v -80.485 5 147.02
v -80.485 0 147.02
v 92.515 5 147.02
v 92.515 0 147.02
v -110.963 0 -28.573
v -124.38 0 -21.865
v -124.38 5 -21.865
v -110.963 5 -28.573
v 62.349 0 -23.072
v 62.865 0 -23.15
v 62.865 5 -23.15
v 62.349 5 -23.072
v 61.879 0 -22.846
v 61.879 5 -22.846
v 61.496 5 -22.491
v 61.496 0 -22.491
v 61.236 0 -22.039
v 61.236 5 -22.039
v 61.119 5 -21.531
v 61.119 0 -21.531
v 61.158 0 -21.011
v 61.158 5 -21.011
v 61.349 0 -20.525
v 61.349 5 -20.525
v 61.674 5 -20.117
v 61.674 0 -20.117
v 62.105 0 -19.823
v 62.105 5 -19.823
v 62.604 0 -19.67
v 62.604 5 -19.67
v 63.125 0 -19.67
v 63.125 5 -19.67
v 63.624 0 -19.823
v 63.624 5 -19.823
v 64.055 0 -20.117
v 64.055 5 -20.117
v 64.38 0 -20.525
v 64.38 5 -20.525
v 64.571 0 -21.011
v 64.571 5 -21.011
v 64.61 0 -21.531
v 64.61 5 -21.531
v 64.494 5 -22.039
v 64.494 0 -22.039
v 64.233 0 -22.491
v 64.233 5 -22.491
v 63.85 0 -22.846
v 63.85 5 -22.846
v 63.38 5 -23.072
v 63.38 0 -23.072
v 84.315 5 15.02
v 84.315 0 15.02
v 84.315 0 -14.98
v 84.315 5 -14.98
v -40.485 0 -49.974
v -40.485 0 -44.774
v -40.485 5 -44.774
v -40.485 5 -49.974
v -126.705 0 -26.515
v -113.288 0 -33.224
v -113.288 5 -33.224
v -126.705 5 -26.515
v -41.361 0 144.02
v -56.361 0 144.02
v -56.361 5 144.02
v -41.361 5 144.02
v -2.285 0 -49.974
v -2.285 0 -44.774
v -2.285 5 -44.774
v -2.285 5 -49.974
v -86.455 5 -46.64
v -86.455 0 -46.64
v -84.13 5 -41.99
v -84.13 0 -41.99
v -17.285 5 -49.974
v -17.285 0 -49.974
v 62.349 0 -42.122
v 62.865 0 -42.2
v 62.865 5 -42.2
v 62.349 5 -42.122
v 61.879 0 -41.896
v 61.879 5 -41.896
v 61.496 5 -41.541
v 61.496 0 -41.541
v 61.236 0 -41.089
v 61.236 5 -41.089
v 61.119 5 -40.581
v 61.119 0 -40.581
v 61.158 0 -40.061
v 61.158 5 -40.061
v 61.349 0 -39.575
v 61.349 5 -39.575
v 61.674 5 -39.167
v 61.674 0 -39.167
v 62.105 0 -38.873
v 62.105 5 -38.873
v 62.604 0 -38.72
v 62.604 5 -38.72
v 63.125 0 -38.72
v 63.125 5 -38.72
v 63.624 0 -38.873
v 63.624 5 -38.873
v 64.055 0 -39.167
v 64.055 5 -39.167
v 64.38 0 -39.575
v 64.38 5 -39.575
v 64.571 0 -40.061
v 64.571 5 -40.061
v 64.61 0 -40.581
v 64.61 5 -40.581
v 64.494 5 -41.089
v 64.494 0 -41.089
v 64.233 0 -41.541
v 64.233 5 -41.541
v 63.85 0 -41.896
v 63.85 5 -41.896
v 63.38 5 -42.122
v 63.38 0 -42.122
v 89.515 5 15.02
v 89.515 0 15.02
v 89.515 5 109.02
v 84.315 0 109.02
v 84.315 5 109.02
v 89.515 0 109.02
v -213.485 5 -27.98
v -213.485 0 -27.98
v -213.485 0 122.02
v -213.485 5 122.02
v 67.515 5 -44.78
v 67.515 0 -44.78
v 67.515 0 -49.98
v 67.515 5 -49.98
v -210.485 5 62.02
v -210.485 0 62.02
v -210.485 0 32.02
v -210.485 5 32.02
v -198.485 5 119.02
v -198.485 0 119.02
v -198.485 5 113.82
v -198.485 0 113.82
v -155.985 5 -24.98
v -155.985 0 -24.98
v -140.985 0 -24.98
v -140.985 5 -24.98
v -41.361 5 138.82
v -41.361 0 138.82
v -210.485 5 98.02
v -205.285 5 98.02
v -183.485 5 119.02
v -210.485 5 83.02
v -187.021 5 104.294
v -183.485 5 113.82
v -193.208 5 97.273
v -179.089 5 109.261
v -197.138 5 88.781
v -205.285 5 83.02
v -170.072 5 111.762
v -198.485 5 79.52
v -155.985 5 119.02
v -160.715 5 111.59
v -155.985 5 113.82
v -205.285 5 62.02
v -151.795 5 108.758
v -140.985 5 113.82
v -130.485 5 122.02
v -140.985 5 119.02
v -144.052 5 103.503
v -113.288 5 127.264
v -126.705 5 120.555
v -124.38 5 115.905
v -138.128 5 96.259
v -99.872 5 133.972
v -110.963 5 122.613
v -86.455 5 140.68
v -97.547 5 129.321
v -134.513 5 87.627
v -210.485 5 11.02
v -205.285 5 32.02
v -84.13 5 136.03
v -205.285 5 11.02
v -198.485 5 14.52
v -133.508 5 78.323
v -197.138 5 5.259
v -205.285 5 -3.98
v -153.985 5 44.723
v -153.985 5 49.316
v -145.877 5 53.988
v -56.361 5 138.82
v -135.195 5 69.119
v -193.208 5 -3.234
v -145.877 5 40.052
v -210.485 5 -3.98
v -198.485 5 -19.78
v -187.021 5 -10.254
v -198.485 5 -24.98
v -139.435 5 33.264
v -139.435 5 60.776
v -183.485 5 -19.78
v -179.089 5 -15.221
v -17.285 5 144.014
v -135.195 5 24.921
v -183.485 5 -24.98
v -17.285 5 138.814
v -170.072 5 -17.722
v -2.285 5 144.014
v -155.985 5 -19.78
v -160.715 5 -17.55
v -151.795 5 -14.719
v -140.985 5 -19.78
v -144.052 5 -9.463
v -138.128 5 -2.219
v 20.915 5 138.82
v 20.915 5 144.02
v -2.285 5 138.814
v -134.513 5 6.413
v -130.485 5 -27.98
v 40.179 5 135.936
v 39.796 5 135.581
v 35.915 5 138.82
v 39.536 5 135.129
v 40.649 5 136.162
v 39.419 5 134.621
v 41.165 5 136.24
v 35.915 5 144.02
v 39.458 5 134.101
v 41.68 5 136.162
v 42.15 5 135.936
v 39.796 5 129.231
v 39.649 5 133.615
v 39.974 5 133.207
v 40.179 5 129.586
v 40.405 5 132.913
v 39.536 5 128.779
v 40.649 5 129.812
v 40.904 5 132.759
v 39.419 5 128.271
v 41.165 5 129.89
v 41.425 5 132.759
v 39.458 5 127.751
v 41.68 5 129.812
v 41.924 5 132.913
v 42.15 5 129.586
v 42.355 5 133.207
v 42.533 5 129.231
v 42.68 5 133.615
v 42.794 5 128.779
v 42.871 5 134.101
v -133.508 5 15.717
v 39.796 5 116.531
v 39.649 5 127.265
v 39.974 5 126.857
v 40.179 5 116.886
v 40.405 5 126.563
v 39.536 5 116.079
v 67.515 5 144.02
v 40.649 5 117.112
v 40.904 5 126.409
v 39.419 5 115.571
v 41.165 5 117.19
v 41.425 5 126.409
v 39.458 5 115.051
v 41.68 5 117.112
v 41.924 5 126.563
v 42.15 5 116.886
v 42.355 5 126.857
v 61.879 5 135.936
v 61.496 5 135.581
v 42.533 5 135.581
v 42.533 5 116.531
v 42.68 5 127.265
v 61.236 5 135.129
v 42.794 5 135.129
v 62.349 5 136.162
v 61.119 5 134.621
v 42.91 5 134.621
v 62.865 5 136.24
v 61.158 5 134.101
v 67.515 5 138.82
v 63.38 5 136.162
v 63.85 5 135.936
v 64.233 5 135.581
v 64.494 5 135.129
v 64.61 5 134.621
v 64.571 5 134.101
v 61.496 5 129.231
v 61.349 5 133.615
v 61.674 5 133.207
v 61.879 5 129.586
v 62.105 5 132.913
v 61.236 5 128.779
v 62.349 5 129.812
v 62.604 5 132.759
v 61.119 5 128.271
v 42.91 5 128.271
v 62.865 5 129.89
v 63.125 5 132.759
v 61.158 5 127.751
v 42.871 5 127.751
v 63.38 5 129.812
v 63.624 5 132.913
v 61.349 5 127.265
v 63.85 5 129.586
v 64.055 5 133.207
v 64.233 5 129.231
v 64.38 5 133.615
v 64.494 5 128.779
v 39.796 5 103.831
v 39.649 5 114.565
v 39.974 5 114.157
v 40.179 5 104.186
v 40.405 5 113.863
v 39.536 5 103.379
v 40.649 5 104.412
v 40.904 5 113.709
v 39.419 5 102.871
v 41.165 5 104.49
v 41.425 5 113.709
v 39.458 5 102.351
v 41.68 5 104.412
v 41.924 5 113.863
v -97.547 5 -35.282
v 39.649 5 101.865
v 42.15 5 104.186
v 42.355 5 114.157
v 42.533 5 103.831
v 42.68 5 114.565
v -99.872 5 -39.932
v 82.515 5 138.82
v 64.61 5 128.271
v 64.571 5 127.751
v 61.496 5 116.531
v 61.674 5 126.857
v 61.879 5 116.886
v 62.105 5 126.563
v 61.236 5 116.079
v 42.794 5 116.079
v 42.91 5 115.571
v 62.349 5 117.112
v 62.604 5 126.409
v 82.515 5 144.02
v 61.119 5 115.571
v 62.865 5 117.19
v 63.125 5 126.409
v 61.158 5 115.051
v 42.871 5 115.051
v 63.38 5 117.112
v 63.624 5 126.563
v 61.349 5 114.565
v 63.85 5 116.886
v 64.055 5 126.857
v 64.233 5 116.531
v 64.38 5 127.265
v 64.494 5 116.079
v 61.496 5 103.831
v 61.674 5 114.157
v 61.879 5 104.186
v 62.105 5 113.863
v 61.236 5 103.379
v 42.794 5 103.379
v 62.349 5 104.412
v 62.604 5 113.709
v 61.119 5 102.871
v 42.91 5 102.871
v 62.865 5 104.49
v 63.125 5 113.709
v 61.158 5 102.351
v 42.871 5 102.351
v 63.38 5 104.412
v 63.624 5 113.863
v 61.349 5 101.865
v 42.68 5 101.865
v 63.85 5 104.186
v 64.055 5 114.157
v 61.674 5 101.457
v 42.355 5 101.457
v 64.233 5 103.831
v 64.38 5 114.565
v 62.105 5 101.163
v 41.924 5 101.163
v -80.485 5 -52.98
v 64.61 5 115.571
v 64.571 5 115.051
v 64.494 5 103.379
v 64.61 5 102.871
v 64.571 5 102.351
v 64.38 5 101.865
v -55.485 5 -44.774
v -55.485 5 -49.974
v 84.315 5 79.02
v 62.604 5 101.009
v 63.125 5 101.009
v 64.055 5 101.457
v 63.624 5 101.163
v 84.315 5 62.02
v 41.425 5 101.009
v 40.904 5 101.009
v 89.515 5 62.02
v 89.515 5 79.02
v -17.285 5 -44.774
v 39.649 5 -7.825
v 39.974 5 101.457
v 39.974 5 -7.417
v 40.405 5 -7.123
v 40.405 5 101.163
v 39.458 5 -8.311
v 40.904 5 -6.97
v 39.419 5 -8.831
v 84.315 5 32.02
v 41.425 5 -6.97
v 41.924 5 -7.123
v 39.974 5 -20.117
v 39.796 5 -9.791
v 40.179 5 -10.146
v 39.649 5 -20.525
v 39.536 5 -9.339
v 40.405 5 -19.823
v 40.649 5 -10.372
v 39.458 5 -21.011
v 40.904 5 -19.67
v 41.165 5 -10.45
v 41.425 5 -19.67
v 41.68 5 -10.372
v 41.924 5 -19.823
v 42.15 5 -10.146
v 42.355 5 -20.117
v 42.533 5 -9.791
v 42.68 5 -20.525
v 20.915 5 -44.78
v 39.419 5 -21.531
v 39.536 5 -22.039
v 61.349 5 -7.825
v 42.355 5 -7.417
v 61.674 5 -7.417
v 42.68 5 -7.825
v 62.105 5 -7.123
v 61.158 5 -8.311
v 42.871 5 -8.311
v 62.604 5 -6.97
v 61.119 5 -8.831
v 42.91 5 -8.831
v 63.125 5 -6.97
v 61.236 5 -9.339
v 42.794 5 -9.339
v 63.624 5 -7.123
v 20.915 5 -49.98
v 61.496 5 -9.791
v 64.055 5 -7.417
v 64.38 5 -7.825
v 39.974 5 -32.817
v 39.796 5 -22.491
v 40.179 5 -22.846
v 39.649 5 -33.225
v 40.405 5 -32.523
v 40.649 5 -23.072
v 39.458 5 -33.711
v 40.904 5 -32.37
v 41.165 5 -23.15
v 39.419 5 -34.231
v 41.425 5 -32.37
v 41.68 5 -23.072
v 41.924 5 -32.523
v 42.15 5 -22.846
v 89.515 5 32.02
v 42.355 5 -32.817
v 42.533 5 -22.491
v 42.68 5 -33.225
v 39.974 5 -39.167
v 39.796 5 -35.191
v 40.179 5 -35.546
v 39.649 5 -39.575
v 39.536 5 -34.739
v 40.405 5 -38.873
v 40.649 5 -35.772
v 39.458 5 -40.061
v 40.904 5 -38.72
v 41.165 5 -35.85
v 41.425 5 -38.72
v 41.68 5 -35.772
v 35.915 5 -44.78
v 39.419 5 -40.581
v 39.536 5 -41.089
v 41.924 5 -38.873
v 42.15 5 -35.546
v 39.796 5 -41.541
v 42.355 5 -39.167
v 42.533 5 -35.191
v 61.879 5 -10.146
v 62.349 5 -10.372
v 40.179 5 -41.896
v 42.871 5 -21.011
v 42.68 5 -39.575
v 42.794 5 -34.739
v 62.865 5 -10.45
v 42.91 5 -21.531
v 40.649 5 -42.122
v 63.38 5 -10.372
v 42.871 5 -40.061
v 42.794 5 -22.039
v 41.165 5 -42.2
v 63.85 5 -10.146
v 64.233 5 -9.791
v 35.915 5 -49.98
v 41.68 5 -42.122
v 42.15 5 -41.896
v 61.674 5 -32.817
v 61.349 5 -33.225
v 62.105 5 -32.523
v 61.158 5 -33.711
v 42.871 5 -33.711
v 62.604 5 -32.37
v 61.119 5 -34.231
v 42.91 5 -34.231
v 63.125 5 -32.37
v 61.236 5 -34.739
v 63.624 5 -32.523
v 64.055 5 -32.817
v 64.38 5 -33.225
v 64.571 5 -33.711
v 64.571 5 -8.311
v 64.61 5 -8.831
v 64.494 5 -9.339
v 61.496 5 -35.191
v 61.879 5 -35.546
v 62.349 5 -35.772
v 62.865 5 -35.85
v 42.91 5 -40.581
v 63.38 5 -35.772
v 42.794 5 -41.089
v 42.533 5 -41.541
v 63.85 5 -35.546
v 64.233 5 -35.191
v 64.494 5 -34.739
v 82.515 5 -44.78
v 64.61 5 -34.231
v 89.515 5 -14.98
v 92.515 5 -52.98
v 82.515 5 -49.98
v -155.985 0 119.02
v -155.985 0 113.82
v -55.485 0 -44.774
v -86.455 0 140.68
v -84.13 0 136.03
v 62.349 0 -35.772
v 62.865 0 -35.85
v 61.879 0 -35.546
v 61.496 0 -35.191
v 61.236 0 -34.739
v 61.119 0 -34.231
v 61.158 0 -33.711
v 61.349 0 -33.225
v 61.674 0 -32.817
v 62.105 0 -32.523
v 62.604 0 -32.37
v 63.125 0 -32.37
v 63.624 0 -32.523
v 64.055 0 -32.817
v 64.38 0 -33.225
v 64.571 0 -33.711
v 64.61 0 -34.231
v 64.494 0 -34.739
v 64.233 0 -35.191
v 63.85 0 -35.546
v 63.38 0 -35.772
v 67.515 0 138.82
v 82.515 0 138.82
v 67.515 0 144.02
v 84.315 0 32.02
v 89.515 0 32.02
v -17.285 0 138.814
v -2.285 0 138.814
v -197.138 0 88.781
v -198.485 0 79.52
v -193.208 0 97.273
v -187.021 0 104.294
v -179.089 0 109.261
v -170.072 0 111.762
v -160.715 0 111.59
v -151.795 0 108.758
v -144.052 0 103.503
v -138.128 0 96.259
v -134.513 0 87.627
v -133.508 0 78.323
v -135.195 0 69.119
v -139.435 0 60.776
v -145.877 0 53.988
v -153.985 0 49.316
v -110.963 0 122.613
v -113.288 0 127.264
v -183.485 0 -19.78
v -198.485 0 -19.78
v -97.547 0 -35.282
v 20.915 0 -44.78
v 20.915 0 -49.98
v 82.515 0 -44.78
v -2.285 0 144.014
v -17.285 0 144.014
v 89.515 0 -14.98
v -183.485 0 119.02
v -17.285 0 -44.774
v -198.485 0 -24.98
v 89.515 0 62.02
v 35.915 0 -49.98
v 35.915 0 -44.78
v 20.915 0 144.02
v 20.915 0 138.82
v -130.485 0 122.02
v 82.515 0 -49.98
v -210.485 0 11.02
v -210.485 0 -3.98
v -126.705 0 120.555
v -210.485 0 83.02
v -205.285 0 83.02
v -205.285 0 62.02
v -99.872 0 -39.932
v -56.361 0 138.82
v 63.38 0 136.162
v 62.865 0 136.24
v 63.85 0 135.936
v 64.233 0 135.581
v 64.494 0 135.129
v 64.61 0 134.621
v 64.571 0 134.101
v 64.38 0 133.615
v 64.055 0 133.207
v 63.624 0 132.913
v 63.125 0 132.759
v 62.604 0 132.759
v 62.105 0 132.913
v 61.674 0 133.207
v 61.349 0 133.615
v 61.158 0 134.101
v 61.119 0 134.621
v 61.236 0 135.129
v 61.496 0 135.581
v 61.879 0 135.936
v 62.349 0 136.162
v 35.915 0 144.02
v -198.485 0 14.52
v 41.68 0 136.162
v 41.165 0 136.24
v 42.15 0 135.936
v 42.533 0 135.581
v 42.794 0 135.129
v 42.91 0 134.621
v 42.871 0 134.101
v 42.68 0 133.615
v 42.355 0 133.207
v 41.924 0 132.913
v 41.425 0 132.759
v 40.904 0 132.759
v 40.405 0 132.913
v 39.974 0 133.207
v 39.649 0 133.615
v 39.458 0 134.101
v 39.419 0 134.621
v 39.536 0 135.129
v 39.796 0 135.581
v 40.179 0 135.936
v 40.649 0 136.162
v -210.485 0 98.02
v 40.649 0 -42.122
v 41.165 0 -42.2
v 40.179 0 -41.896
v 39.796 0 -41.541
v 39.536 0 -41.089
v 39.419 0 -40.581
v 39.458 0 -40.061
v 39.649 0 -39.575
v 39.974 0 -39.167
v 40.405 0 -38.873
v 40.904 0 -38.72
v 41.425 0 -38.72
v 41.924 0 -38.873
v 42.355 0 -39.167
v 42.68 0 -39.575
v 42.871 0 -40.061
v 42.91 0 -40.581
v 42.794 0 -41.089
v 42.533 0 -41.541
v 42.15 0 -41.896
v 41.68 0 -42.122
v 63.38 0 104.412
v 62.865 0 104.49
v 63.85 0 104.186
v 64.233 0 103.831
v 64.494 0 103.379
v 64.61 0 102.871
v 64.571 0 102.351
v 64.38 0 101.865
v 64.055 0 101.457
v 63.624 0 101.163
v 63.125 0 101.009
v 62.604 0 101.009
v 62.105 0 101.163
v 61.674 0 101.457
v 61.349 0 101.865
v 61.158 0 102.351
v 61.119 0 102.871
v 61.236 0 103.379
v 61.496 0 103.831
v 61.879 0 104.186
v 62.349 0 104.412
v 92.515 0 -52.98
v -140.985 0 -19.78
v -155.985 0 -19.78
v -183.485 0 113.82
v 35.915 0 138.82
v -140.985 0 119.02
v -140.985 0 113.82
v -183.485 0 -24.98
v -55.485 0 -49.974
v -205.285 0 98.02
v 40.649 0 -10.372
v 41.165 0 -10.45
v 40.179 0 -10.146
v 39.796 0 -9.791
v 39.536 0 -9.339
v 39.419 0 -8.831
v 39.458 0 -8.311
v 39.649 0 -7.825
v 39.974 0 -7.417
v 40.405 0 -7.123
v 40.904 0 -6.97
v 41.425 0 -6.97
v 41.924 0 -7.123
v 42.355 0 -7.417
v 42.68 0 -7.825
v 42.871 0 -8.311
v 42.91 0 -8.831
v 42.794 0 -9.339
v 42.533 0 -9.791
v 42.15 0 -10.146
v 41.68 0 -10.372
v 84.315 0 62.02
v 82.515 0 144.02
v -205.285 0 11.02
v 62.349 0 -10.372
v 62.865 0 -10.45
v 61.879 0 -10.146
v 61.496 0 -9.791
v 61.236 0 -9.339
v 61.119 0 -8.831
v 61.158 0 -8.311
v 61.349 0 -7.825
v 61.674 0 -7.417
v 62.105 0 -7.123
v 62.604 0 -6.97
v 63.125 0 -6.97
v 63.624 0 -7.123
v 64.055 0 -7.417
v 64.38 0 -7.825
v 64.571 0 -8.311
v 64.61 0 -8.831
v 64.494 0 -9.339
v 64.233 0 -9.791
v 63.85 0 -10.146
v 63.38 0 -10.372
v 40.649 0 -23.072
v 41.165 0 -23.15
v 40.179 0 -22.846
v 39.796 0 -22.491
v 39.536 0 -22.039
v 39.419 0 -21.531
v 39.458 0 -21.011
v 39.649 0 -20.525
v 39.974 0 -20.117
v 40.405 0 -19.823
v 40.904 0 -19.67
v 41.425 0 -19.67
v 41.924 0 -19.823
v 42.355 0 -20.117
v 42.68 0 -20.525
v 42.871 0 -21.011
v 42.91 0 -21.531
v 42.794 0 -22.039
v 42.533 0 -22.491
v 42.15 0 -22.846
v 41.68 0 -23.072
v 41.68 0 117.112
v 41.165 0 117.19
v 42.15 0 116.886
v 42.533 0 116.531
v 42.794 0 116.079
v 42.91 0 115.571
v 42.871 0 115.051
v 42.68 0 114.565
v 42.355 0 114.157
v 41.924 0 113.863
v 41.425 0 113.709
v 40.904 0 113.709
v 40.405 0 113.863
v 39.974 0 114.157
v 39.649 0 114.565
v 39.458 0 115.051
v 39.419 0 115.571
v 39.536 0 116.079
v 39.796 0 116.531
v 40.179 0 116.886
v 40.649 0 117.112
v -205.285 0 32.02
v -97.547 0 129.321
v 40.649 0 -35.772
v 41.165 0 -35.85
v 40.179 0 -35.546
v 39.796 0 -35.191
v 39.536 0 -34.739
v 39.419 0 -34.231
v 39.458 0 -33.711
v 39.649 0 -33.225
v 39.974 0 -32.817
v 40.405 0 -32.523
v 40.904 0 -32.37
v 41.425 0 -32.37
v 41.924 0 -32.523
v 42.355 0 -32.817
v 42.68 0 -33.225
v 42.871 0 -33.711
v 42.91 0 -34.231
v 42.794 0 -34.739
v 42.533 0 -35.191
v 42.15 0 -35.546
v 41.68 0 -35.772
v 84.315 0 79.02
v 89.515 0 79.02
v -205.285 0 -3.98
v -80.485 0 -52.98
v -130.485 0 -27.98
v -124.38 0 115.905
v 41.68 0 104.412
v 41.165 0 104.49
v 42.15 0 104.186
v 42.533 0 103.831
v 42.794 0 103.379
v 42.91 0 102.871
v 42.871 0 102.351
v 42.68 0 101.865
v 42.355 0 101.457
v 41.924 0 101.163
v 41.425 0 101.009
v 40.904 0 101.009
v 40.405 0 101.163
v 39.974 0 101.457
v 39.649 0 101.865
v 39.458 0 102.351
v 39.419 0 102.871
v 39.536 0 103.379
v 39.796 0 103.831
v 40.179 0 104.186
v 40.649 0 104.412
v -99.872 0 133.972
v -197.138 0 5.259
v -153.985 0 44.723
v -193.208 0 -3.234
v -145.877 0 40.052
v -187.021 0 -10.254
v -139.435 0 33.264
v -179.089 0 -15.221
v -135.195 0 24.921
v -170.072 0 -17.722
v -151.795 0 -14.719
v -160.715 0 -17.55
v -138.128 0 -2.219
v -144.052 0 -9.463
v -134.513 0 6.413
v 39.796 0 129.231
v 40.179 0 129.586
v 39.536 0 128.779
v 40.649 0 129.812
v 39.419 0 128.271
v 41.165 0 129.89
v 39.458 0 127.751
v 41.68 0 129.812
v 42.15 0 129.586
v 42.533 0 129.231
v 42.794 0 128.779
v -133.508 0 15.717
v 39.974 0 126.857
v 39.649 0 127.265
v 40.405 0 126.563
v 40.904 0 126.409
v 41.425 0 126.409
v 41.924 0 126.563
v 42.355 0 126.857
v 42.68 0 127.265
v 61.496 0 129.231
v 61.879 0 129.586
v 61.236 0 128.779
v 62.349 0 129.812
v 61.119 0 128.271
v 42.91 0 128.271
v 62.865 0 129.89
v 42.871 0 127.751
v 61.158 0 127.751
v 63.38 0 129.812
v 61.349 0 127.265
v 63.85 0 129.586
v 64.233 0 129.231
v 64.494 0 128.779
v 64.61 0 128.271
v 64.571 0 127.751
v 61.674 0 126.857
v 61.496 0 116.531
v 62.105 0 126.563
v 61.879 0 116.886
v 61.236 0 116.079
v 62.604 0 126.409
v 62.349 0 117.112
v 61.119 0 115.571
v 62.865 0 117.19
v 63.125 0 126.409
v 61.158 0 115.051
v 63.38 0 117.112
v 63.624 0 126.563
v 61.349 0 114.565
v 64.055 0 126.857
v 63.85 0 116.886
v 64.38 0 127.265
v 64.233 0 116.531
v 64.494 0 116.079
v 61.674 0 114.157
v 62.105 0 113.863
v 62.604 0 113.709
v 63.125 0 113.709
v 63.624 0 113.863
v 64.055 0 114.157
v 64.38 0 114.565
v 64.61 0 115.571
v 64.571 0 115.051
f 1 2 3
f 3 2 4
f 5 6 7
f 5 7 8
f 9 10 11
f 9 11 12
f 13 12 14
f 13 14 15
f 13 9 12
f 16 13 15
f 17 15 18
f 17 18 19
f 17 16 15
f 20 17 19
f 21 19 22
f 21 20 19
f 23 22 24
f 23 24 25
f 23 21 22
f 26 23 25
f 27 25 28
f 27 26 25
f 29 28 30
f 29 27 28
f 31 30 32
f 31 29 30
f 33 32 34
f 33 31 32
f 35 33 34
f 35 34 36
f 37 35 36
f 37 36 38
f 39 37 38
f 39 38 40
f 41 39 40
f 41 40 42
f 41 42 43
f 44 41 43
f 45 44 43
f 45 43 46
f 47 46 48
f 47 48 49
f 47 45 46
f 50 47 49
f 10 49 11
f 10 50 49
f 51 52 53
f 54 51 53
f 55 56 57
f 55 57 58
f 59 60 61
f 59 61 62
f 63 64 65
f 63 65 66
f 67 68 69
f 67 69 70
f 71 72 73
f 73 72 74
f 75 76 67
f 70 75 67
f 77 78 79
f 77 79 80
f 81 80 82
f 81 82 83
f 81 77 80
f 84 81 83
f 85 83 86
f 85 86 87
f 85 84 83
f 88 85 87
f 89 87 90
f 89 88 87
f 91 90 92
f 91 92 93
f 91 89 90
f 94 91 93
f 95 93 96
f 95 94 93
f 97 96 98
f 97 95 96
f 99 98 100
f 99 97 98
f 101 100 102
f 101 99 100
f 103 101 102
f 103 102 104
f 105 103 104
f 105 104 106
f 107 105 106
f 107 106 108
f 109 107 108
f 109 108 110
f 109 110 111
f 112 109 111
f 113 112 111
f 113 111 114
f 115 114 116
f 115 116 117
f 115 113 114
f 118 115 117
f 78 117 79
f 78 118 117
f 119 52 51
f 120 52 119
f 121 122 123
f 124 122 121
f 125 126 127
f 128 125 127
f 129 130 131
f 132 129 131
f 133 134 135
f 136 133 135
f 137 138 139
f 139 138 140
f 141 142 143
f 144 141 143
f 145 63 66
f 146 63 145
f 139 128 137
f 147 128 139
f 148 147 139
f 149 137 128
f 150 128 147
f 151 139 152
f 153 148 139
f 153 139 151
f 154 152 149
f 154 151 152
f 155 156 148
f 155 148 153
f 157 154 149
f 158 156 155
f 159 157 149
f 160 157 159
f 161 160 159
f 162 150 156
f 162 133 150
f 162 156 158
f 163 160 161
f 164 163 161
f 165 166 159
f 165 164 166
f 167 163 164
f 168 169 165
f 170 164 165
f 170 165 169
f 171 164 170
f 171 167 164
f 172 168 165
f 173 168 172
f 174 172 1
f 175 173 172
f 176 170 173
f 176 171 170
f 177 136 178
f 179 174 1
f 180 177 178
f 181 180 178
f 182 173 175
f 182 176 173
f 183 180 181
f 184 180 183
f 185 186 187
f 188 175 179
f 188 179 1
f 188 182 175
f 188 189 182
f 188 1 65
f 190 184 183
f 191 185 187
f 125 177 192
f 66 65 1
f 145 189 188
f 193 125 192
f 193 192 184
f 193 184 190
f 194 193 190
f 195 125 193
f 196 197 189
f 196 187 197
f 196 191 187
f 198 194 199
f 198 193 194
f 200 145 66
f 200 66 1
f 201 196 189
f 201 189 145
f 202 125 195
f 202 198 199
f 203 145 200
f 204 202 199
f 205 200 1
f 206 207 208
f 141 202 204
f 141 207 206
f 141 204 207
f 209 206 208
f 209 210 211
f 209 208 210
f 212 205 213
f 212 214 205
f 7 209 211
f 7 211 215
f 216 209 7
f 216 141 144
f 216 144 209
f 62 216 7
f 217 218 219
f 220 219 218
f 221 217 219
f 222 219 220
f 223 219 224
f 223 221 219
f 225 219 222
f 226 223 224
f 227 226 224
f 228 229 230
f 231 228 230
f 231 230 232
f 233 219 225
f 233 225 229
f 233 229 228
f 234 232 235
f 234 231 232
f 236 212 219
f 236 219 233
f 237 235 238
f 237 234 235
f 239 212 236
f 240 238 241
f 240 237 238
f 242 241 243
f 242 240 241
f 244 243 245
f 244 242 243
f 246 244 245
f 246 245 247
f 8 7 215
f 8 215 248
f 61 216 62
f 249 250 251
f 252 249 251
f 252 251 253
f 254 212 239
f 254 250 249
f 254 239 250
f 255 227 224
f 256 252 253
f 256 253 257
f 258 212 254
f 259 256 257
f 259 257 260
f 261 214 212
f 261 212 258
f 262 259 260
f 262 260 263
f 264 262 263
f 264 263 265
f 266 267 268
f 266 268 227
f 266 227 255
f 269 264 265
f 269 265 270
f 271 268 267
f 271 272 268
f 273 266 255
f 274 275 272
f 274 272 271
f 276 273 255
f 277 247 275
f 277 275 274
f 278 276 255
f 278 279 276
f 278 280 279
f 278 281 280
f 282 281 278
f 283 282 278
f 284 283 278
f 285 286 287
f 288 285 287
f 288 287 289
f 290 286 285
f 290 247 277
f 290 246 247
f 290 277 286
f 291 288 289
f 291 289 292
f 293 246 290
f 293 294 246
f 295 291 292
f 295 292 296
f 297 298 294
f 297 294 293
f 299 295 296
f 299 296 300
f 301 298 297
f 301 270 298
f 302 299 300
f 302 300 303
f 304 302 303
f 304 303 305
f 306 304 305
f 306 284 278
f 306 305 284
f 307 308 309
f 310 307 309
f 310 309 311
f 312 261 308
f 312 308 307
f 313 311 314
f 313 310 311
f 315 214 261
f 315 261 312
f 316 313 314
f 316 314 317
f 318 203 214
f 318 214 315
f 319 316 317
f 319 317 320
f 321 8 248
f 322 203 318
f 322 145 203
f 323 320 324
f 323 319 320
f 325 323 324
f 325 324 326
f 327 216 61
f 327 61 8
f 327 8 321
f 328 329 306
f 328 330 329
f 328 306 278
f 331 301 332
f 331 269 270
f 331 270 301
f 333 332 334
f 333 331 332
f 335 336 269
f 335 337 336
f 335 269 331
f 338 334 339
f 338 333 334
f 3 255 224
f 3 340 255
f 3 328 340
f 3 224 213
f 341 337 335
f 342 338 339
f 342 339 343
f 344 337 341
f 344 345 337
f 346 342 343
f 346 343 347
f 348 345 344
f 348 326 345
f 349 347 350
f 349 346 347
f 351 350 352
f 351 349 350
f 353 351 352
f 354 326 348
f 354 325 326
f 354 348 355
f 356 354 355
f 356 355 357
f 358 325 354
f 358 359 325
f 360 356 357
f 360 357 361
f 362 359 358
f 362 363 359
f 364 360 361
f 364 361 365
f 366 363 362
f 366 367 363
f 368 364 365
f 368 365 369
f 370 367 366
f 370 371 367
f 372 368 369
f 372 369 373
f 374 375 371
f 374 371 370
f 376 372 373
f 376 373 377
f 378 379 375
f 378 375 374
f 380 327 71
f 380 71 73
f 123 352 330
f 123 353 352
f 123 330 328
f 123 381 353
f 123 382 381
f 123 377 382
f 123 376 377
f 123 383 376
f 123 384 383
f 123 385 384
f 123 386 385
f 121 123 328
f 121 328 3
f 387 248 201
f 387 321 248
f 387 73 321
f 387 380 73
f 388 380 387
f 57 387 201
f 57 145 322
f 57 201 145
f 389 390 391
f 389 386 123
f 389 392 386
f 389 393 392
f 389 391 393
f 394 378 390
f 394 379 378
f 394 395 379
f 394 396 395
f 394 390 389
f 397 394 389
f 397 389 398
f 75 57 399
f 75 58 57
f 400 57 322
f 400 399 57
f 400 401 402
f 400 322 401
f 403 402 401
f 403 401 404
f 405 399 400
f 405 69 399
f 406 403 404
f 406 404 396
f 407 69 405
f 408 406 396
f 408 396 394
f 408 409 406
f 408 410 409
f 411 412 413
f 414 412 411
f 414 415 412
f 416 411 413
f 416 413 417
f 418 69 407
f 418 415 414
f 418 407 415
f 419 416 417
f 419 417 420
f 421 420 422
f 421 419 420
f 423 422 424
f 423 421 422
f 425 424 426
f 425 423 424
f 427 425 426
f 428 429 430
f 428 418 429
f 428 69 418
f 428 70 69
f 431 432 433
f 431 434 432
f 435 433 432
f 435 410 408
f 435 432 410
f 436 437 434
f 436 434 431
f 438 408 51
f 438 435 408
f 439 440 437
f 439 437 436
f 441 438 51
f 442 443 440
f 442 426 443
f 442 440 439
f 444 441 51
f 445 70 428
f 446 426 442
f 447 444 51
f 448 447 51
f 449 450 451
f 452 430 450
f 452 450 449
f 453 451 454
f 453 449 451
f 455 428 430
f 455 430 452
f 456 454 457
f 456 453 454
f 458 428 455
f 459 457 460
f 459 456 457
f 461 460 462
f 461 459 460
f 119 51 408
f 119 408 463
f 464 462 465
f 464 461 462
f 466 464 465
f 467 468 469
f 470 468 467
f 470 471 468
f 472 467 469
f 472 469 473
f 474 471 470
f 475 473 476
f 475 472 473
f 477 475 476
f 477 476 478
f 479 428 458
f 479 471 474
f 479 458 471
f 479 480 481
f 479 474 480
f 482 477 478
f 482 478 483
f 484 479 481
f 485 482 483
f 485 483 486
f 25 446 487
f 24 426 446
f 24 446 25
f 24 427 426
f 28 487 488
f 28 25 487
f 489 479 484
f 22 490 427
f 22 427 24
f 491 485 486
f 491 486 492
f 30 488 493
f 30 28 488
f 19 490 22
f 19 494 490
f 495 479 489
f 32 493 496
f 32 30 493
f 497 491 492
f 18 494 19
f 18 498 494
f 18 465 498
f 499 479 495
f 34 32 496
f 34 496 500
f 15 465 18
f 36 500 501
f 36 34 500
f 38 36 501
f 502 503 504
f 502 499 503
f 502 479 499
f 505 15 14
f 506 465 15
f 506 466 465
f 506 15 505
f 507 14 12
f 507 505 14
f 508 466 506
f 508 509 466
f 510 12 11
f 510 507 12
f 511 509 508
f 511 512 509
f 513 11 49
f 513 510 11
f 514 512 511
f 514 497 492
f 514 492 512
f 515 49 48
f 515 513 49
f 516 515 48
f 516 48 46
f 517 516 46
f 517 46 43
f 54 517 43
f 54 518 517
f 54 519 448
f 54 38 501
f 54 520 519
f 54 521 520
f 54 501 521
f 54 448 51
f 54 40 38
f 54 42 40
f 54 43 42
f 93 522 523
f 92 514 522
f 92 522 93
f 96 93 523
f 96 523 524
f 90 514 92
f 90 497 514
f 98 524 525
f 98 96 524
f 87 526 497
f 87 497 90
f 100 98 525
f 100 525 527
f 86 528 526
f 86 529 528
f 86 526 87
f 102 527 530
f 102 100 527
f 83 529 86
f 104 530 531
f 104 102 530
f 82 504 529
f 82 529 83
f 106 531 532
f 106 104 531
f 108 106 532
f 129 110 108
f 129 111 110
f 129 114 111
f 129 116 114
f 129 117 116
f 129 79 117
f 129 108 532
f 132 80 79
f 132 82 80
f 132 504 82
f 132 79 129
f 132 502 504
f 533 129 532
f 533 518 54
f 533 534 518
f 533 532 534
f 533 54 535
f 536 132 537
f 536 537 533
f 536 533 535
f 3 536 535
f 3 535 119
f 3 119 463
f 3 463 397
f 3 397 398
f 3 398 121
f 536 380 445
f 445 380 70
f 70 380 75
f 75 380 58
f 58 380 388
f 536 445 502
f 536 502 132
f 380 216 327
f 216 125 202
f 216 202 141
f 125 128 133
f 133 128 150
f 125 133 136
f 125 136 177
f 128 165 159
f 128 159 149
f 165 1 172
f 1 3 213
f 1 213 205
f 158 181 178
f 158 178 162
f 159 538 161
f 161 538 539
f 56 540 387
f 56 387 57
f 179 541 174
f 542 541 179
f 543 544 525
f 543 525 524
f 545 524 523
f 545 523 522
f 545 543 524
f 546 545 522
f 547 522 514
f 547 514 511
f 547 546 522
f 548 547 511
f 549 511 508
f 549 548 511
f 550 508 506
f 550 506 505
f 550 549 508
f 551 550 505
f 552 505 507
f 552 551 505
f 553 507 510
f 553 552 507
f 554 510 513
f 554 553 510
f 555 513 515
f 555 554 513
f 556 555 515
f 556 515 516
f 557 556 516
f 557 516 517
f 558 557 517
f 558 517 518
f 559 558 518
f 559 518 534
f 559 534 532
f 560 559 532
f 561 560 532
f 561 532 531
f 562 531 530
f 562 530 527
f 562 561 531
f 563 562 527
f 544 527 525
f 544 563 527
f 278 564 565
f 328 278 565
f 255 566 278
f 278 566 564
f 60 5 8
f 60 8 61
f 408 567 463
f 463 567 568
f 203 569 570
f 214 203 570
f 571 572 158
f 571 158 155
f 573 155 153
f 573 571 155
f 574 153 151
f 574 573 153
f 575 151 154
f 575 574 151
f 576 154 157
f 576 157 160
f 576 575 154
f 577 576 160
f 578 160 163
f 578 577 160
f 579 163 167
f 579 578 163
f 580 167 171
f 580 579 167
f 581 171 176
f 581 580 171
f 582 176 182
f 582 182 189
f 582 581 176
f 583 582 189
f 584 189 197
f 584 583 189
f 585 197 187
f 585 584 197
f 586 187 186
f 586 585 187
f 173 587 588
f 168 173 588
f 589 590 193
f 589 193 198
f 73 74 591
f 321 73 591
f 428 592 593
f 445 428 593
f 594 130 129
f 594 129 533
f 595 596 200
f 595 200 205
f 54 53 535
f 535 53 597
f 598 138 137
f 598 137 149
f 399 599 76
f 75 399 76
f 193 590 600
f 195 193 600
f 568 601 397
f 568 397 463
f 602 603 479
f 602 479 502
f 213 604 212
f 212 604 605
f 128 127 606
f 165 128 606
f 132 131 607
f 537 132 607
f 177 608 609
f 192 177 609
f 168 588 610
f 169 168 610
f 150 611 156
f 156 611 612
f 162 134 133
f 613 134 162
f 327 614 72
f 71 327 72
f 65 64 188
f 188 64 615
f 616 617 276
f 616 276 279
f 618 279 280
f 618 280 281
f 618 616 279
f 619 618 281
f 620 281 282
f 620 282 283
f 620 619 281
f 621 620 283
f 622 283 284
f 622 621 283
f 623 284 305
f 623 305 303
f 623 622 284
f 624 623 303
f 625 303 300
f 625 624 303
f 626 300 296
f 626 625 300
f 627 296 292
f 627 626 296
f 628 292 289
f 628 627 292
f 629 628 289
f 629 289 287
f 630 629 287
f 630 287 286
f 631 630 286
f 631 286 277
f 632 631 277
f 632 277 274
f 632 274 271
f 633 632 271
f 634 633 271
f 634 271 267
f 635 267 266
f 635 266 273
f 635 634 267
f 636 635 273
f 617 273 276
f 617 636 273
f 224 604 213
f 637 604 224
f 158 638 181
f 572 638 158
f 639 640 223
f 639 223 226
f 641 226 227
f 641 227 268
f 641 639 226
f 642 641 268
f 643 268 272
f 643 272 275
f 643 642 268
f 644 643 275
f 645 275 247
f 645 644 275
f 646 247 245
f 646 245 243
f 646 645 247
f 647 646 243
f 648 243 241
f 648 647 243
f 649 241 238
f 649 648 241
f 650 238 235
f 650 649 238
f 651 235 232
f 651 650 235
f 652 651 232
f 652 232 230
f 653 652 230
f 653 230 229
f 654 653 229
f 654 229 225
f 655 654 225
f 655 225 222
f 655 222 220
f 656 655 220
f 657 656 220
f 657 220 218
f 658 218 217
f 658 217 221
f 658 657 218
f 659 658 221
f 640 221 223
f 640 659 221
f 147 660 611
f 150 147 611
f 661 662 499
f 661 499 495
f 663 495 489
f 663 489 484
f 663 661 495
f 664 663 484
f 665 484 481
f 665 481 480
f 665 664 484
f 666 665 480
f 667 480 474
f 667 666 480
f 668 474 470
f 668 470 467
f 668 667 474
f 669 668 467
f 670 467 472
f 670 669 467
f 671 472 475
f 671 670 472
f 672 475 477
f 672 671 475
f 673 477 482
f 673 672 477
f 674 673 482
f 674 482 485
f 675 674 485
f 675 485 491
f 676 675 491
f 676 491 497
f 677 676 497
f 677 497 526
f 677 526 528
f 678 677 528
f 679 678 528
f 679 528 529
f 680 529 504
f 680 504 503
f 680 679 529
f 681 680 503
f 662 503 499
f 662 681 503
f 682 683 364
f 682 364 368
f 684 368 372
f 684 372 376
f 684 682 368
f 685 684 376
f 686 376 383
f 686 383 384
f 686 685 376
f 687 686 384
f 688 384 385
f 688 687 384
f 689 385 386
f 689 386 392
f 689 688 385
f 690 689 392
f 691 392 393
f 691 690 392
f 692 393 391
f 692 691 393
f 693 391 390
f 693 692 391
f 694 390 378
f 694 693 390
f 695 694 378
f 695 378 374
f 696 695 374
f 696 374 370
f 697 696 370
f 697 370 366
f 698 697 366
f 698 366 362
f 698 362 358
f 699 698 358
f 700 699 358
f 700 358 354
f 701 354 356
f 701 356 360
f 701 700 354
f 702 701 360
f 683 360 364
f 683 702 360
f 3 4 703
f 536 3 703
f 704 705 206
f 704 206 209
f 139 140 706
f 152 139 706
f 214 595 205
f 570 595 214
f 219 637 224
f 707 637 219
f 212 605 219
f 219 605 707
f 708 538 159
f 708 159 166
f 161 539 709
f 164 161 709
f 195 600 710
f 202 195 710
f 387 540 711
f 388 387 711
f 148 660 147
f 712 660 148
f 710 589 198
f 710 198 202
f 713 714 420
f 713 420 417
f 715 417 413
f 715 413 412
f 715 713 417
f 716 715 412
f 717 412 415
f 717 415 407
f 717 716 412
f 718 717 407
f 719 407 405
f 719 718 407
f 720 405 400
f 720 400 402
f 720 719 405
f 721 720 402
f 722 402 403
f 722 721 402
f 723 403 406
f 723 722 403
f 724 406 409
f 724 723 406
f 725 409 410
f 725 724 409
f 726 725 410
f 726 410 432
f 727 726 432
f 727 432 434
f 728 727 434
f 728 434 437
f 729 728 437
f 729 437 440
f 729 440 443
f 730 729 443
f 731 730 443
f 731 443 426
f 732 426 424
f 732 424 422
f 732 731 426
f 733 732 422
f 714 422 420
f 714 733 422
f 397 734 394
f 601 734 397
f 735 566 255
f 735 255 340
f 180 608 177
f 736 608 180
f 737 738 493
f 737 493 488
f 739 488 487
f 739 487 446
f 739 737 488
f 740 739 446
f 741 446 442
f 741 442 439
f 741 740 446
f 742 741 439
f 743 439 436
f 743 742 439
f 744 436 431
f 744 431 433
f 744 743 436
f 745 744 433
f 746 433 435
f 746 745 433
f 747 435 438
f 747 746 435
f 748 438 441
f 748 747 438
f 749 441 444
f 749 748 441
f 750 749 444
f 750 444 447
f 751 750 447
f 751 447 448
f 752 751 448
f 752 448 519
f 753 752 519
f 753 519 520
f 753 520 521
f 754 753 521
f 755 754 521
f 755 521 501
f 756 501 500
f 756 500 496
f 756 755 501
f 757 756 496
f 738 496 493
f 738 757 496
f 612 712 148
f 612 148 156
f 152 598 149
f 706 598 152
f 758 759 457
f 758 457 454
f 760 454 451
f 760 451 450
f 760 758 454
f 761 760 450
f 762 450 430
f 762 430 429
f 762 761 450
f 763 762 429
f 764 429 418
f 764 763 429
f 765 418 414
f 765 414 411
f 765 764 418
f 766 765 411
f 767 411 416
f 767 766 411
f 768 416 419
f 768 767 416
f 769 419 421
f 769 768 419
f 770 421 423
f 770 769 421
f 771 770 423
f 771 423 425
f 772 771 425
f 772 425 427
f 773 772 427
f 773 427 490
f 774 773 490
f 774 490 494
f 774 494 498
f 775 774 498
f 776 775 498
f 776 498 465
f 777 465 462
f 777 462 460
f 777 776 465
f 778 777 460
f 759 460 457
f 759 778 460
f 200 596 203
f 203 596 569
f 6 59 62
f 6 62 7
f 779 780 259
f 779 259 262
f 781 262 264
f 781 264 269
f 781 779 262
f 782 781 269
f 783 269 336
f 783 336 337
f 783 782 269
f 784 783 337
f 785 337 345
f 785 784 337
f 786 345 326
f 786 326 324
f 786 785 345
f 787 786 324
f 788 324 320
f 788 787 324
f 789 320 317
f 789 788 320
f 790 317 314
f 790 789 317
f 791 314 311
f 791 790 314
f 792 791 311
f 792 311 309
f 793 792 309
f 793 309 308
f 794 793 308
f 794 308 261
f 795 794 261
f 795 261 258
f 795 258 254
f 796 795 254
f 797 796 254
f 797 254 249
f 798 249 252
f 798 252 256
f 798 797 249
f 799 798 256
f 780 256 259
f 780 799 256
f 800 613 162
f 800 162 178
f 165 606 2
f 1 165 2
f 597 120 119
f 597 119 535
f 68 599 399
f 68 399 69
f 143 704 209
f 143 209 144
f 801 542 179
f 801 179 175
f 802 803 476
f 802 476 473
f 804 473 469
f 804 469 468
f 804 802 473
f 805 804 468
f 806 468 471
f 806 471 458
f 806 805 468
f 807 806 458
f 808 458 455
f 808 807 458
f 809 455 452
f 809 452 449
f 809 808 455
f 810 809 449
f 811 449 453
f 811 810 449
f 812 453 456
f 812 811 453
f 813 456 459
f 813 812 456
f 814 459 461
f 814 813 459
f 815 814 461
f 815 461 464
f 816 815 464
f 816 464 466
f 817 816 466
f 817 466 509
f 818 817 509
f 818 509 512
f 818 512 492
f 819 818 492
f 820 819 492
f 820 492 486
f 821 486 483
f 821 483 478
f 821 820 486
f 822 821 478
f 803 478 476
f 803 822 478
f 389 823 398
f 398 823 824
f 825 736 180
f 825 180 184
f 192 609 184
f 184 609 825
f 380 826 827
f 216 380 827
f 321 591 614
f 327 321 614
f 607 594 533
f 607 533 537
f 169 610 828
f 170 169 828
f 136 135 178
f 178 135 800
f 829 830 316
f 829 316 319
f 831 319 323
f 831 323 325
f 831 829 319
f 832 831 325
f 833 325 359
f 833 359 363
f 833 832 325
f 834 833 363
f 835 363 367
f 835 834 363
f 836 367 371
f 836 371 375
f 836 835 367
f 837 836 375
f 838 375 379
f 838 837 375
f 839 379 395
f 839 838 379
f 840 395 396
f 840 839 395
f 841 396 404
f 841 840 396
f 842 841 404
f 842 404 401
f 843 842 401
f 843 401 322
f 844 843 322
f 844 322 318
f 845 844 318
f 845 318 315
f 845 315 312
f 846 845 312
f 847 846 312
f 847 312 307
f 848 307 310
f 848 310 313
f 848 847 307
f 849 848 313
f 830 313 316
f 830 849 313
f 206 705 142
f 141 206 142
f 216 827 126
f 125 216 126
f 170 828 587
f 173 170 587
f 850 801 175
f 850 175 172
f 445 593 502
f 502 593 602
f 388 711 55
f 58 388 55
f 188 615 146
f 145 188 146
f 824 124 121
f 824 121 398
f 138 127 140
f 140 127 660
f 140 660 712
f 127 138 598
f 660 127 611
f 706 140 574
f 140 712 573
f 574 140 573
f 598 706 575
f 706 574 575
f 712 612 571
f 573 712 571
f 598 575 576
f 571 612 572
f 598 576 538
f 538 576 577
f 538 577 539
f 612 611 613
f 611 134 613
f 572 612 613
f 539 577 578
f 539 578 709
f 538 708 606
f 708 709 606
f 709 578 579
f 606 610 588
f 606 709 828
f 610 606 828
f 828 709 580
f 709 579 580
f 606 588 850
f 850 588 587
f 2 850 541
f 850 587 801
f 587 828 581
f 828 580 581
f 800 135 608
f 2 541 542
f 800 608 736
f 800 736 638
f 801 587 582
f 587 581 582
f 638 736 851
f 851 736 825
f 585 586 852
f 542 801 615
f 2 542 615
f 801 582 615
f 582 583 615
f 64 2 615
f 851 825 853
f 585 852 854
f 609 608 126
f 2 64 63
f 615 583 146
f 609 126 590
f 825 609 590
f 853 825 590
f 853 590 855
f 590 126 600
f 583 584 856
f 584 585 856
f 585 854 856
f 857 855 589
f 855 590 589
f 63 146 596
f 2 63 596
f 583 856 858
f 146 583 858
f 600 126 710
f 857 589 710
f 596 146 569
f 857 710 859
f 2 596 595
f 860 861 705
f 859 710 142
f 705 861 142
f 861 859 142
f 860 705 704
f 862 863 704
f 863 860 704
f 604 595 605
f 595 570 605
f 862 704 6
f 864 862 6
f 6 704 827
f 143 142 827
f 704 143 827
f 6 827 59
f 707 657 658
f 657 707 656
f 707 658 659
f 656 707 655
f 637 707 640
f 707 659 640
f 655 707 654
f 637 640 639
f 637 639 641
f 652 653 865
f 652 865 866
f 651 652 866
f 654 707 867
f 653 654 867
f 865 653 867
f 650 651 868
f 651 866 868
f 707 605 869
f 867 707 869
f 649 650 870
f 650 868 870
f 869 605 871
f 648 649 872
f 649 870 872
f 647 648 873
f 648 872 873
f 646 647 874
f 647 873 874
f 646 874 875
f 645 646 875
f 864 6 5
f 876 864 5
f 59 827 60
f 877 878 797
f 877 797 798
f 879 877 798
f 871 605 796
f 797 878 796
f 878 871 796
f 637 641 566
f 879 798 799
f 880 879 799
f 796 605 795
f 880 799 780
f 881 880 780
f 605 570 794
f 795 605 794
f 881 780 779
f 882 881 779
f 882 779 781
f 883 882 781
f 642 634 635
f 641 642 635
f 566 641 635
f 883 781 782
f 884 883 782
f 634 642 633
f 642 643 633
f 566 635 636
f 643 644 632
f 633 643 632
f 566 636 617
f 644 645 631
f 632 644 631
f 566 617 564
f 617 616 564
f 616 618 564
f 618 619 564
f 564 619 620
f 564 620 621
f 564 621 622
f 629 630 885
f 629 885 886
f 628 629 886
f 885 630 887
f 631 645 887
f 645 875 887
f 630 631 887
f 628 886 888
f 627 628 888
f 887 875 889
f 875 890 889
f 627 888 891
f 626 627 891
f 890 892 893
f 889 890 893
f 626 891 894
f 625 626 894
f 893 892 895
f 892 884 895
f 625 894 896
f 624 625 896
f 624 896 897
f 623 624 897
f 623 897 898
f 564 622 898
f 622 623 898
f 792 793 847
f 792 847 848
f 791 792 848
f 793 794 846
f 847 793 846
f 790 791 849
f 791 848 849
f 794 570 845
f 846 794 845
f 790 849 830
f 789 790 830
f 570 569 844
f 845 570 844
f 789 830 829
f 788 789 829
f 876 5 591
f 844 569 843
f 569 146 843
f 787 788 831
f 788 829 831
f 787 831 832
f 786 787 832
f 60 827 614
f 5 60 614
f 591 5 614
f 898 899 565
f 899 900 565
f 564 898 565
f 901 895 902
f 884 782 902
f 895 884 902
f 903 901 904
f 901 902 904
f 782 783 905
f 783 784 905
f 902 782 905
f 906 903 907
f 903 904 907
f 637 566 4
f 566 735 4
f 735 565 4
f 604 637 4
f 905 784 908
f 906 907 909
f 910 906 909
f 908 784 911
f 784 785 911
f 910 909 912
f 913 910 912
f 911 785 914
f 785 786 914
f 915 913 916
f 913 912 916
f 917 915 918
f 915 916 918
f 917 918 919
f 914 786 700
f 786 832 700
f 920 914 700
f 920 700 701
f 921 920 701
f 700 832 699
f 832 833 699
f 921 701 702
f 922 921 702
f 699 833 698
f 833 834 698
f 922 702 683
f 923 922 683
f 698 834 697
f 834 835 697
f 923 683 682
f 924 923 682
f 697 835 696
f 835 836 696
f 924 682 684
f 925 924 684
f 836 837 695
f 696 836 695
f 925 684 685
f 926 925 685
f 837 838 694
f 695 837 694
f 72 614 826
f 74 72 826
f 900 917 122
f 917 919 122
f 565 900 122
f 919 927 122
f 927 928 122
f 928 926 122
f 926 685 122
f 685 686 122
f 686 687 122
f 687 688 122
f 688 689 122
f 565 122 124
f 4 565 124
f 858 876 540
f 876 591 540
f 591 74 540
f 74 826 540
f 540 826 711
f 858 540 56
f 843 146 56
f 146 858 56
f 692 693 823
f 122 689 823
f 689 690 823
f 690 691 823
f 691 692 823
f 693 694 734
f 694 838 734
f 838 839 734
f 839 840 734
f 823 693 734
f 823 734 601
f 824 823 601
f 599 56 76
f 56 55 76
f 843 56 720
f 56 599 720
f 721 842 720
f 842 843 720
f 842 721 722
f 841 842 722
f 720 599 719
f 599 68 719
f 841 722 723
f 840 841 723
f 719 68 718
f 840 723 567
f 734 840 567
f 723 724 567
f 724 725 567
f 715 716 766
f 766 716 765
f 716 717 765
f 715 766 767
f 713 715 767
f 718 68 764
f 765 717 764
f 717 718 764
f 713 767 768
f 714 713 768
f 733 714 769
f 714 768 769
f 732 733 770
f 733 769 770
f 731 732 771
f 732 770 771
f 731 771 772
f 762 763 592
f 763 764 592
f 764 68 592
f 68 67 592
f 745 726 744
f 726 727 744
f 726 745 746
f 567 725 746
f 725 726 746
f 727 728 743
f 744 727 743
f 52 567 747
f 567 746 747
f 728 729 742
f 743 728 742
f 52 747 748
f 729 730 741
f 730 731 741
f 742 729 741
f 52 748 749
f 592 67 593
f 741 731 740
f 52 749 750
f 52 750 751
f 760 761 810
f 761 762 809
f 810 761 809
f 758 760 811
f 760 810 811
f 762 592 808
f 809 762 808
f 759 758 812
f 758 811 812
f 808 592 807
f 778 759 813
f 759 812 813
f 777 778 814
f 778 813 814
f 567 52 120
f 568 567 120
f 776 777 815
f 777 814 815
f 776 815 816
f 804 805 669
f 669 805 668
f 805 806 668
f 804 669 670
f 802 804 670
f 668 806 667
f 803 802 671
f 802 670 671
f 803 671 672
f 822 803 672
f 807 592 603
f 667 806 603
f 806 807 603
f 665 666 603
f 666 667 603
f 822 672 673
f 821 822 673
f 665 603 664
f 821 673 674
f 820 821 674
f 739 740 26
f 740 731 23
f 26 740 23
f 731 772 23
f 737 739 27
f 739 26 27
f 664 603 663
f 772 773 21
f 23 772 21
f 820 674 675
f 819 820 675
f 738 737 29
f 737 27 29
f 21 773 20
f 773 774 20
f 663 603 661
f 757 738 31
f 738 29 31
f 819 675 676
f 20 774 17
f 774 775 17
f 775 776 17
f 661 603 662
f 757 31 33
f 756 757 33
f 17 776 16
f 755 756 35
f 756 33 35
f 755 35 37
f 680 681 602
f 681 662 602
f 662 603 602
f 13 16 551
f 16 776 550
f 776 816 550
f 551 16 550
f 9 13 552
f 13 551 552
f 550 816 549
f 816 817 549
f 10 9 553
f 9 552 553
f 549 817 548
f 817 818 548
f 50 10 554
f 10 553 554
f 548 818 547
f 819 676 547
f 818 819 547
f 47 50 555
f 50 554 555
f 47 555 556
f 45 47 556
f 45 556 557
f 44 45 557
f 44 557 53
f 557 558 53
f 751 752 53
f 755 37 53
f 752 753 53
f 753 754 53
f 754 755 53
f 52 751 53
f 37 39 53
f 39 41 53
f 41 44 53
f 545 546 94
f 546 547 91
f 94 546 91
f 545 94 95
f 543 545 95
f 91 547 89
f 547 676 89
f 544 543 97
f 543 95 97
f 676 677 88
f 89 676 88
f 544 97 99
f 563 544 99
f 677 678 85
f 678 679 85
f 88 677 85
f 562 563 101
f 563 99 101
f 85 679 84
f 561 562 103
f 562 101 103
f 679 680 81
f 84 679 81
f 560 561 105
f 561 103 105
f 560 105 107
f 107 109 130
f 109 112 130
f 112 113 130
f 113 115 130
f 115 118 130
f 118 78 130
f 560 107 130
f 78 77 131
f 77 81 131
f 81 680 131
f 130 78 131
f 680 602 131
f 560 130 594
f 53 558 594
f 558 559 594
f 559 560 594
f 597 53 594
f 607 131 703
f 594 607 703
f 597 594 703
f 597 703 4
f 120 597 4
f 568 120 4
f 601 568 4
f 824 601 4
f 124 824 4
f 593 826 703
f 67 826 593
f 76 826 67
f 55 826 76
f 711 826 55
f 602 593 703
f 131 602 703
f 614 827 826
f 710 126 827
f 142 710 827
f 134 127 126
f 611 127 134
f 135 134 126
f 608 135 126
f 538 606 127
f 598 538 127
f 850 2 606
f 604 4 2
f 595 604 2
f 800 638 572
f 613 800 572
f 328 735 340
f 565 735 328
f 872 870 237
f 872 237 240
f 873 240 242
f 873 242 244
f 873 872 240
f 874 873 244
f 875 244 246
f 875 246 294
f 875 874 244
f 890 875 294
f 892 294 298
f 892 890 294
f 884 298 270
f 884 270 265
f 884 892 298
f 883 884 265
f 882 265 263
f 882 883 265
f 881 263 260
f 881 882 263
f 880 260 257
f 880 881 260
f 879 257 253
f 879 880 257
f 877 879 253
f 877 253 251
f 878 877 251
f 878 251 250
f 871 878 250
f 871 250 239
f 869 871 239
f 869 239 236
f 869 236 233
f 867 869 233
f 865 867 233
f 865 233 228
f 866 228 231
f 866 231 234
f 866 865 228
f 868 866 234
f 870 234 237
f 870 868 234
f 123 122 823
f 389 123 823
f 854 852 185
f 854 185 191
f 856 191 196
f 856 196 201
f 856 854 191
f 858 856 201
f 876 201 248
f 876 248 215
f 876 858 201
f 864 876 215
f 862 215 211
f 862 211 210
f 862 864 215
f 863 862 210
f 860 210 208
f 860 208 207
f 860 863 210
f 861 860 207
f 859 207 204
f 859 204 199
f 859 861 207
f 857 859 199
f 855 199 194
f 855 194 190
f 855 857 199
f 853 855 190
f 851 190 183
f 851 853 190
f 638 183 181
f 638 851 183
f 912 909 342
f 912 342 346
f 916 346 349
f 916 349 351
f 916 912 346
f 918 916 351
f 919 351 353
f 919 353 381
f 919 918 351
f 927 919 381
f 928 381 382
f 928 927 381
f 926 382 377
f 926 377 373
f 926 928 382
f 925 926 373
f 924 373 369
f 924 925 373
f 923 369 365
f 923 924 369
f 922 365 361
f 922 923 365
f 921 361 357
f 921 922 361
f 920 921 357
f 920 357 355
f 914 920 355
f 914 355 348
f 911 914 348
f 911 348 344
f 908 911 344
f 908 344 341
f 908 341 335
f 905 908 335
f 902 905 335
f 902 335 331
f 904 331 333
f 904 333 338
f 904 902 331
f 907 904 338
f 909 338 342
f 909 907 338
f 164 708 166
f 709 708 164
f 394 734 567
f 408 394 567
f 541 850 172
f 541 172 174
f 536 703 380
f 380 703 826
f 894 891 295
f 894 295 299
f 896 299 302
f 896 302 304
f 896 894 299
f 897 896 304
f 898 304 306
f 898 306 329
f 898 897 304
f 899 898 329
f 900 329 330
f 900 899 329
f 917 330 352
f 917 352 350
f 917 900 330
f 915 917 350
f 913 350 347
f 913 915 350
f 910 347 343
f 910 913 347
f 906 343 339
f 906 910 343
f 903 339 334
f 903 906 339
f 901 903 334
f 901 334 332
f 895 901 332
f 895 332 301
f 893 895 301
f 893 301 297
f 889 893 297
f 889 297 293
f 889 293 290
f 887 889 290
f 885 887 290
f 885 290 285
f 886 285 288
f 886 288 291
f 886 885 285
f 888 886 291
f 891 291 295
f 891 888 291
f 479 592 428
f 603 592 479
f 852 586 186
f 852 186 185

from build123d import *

# Parameters (mm, degrees)
SKETCH1_R           = 1.75
SKETCH1_W           = 15
SKETCH1_H           = 5.2
SKETCH1_W_2         = 5.2
SKETCH1_H_2         = 30
SKETCH1_H_3         = 15
BOSS_EXTRUDE1_DEPTH = 5


with BuildPart() as part:
    # Sketch1 → Boss-Extrude1 (new body)
    with BuildSketch(Plane(origin=(0, 0, 0), x_dir=(1, 0, 0), z_dir=(0, 1, 0))):
        Polygon((92.514530464, -147.019914311), (92.514530464, 52.980085689), (-80.485469536, 52.980085689), (-130.485469536, 27.980085689), (-213.485469536, 27.980085689), (-213.485469536, -122.019914311), (-130.485469536, -122.019914311), (-80.485469536, -147.019914311), align=None)
        with Locations(Location((62.864530464, -134.489914311, 0), (0, 0, 270))):
            Circle(SKETCH1_R, mode=Mode.SUBTRACT)
        with Locations(Location((41.164530464, -134.489914311, 0), (0, 0, 270))):
            Circle(SKETCH1_R, mode=Mode.SUBTRACT)
        with Locations(Location((62.864530464, -128.139914311, 0), (0, 0, 270))):
            Circle(SKETCH1_R, mode=Mode.SUBTRACT)
        with Locations(Location((41.164530464, -128.139914311, 0), (0, 0, 270))):
            Circle(SKETCH1_R, mode=Mode.SUBTRACT)
        with Locations(Location((62.864530464, -115.439914311, 0), (0, 0, 270))):
            Circle(SKETCH1_R, mode=Mode.SUBTRACT)
        with Locations(Location((41.164530464, -115.439914311, 0), (0, 0, 270))):
            Circle(SKETCH1_R, mode=Mode.SUBTRACT)
        with Locations(Location((62.864530464, -102.739914311, 0), (0, 0, 270))):
            Circle(SKETCH1_R, mode=Mode.SUBTRACT)
        with Locations(Location((41.164530464, -102.739914311, 0), (0, 0, 270))):
            Circle(SKETCH1_R, mode=Mode.SUBTRACT)
        with Locations(Location((41.164530464, 8.700085689, 0), (0, 0, 90))):
            Circle(SKETCH1_R, mode=Mode.SUBTRACT)
        with Locations(Location((41.164530464, 21.400085689, 0), (0, 0, 90))):
            Circle(SKETCH1_R, mode=Mode.SUBTRACT)
        with Locations(Location((41.164530464, 34.100085689, 0), (0, 0, 90))):
            Circle(SKETCH1_R, mode=Mode.SUBTRACT)
        with Locations(Location((41.164530464, 40.450085689, 0), (0, 0, 90))):
            Circle(SKETCH1_R, mode=Mode.SUBTRACT)
        with Locations(Location((62.864530464, 8.700085689, 0), (0, 0, 90))):
            Circle(SKETCH1_R, mode=Mode.SUBTRACT)
        with Locations(Location((62.864530464, 21.400085689, 0), (0, 0, 90))):
            Circle(SKETCH1_R, mode=Mode.SUBTRACT)
        with Locations(Location((62.864530464, 34.100085689, 0), (0, 0, 90))):
            Circle(SKETCH1_R, mode=Mode.SUBTRACT)
        with Locations(Location((62.864530464, 40.450085689, 0), (0, 0, 90))):
            Circle(SKETCH1_R, mode=Mode.SUBTRACT)
        with Locations((75.014530464, 47.380085689)):
            Rectangle(SKETCH1_W, SKETCH1_H, mode=Mode.SUBTRACT)
        with Locations((75.014530464, -141.419914311)):
            Rectangle(SKETCH1_W, SKETCH1_H, mode=Mode.SUBTRACT)
        with Locations((86.914530464, -0.019914311)):
            Rectangle(SKETCH1_W_2, SKETCH1_H_2, mode=Mode.SUBTRACT)
        with Locations((86.914530464, -47.019914311)):
            Rectangle(SKETCH1_W_2, SKETCH1_H_2, mode=Mode.SUBTRACT)
        with Locations((86.914530464, -94.019914311)):
            Rectangle(SKETCH1_W_2, SKETCH1_H_2, mode=Mode.SUBTRACT)
        with Locations((-9.785469536, 47.373767599)):
            Rectangle(SKETCH1_W, SKETCH1_H, mode=Mode.SUBTRACT)
        with Locations((-47.985469536, 47.373767599)):
            Rectangle(SKETCH1_W, SKETCH1_H, mode=Mode.SUBTRACT)
        with Locations((-148.485469536, 22.380085689)):
            Rectangle(SKETCH1_W, SKETCH1_H, mode=Mode.SUBTRACT)
        with Locations((-190.985469536, 22.380085689)):
            Rectangle(SKETCH1_W, SKETCH1_H, mode=Mode.SUBTRACT)
        with Locations((-207.885469536, -3.519914311)):
            Rectangle(SKETCH1_W_2, SKETCH1_H_3, mode=Mode.SUBTRACT)
        with Locations((-207.885469536, -47.019914311)):
            Rectangle(SKETCH1_W_2, SKETCH1_H_2, mode=Mode.SUBTRACT)
        with Locations((-207.885469536, -90.519914311)):
            Rectangle(SKETCH1_W_2, SKETCH1_H_3, mode=Mode.SUBTRACT)
        with Locations((-48.86060515, -141.420106162)):
            Rectangle(SKETCH1_W, SKETCH1_H, mode=Mode.SUBTRACT)
        with Locations((-148.485469536, -116.419914311)):
            Rectangle(SKETCH1_W, SKETCH1_H, mode=Mode.SUBTRACT)
        with Locations((-190.985469536, -116.419914311)):
            Rectangle(SKETCH1_W, SKETCH1_H, mode=Mode.SUBTRACT)
        with Locations((28.414530464, 47.380085689)):
            Rectangle(SKETCH1_W, SKETCH1_H, mode=Mode.SUBTRACT)
        with BuildLine():
            Line((-153.985469536, -47.019914311), (-153.985469536, -44.723390932))
            ThreePointArc((-153.985469536, -44.723390932), (-147.733757287, 12.371069308), (-198.485469536, -14.519914311))
            Line((-198.485469536, -14.519914311), (-198.485469536, -79.519914311))
            ThreePointArc((-198.485469536, -79.519914311), (-147.733757287, -106.41089793), (-153.985469536, -49.31643769))
            Line((-153.985469536, -49.31643769), (-153.985469536, -47.019914311))
        make_face(mode=Mode.SUBTRACT)
        with Locations((28.414530464, -141.419914311)):
            Rectangle(SKETCH1_W, SKETCH1_H, mode=Mode.SUBTRACT)
        with Locations((-9.785469536, -141.413596222)):
            Rectangle(SKETCH1_W, SKETCH1_H, mode=Mode.SUBTRACT)
        Polygon((-110.963133782, 28.573374858), (-113.288285266, 33.223677824), (-126.704693131, 26.515473891), (-124.379541647, 21.865170925), align=None, mode=Mode.SUBTRACT)
        Polygon((-86.455469536, 46.640085689), (-84.130318052, 41.989782723), (-97.546725917, 35.28157879), (-99.871877401, 39.931881756), align=None, mode=Mode.SUBTRACT)
        Polygon((-99.871877401, -133.971710379), (-86.455469536, -140.679914311), (-84.130318052, -136.029611345), (-97.546725917, -129.321407413), align=None, mode=Mode.SUBTRACT)
        Polygon((-124.379541647, -115.904999548), (-110.963133782, -122.61320348), (-113.288285266, -127.263506446), (-126.704693131, -120.555302514), align=None, mode=Mode.SUBTRACT)
    extrude(amount=BOSS_EXTRUDE1_DEPTH)


solid = part.part
